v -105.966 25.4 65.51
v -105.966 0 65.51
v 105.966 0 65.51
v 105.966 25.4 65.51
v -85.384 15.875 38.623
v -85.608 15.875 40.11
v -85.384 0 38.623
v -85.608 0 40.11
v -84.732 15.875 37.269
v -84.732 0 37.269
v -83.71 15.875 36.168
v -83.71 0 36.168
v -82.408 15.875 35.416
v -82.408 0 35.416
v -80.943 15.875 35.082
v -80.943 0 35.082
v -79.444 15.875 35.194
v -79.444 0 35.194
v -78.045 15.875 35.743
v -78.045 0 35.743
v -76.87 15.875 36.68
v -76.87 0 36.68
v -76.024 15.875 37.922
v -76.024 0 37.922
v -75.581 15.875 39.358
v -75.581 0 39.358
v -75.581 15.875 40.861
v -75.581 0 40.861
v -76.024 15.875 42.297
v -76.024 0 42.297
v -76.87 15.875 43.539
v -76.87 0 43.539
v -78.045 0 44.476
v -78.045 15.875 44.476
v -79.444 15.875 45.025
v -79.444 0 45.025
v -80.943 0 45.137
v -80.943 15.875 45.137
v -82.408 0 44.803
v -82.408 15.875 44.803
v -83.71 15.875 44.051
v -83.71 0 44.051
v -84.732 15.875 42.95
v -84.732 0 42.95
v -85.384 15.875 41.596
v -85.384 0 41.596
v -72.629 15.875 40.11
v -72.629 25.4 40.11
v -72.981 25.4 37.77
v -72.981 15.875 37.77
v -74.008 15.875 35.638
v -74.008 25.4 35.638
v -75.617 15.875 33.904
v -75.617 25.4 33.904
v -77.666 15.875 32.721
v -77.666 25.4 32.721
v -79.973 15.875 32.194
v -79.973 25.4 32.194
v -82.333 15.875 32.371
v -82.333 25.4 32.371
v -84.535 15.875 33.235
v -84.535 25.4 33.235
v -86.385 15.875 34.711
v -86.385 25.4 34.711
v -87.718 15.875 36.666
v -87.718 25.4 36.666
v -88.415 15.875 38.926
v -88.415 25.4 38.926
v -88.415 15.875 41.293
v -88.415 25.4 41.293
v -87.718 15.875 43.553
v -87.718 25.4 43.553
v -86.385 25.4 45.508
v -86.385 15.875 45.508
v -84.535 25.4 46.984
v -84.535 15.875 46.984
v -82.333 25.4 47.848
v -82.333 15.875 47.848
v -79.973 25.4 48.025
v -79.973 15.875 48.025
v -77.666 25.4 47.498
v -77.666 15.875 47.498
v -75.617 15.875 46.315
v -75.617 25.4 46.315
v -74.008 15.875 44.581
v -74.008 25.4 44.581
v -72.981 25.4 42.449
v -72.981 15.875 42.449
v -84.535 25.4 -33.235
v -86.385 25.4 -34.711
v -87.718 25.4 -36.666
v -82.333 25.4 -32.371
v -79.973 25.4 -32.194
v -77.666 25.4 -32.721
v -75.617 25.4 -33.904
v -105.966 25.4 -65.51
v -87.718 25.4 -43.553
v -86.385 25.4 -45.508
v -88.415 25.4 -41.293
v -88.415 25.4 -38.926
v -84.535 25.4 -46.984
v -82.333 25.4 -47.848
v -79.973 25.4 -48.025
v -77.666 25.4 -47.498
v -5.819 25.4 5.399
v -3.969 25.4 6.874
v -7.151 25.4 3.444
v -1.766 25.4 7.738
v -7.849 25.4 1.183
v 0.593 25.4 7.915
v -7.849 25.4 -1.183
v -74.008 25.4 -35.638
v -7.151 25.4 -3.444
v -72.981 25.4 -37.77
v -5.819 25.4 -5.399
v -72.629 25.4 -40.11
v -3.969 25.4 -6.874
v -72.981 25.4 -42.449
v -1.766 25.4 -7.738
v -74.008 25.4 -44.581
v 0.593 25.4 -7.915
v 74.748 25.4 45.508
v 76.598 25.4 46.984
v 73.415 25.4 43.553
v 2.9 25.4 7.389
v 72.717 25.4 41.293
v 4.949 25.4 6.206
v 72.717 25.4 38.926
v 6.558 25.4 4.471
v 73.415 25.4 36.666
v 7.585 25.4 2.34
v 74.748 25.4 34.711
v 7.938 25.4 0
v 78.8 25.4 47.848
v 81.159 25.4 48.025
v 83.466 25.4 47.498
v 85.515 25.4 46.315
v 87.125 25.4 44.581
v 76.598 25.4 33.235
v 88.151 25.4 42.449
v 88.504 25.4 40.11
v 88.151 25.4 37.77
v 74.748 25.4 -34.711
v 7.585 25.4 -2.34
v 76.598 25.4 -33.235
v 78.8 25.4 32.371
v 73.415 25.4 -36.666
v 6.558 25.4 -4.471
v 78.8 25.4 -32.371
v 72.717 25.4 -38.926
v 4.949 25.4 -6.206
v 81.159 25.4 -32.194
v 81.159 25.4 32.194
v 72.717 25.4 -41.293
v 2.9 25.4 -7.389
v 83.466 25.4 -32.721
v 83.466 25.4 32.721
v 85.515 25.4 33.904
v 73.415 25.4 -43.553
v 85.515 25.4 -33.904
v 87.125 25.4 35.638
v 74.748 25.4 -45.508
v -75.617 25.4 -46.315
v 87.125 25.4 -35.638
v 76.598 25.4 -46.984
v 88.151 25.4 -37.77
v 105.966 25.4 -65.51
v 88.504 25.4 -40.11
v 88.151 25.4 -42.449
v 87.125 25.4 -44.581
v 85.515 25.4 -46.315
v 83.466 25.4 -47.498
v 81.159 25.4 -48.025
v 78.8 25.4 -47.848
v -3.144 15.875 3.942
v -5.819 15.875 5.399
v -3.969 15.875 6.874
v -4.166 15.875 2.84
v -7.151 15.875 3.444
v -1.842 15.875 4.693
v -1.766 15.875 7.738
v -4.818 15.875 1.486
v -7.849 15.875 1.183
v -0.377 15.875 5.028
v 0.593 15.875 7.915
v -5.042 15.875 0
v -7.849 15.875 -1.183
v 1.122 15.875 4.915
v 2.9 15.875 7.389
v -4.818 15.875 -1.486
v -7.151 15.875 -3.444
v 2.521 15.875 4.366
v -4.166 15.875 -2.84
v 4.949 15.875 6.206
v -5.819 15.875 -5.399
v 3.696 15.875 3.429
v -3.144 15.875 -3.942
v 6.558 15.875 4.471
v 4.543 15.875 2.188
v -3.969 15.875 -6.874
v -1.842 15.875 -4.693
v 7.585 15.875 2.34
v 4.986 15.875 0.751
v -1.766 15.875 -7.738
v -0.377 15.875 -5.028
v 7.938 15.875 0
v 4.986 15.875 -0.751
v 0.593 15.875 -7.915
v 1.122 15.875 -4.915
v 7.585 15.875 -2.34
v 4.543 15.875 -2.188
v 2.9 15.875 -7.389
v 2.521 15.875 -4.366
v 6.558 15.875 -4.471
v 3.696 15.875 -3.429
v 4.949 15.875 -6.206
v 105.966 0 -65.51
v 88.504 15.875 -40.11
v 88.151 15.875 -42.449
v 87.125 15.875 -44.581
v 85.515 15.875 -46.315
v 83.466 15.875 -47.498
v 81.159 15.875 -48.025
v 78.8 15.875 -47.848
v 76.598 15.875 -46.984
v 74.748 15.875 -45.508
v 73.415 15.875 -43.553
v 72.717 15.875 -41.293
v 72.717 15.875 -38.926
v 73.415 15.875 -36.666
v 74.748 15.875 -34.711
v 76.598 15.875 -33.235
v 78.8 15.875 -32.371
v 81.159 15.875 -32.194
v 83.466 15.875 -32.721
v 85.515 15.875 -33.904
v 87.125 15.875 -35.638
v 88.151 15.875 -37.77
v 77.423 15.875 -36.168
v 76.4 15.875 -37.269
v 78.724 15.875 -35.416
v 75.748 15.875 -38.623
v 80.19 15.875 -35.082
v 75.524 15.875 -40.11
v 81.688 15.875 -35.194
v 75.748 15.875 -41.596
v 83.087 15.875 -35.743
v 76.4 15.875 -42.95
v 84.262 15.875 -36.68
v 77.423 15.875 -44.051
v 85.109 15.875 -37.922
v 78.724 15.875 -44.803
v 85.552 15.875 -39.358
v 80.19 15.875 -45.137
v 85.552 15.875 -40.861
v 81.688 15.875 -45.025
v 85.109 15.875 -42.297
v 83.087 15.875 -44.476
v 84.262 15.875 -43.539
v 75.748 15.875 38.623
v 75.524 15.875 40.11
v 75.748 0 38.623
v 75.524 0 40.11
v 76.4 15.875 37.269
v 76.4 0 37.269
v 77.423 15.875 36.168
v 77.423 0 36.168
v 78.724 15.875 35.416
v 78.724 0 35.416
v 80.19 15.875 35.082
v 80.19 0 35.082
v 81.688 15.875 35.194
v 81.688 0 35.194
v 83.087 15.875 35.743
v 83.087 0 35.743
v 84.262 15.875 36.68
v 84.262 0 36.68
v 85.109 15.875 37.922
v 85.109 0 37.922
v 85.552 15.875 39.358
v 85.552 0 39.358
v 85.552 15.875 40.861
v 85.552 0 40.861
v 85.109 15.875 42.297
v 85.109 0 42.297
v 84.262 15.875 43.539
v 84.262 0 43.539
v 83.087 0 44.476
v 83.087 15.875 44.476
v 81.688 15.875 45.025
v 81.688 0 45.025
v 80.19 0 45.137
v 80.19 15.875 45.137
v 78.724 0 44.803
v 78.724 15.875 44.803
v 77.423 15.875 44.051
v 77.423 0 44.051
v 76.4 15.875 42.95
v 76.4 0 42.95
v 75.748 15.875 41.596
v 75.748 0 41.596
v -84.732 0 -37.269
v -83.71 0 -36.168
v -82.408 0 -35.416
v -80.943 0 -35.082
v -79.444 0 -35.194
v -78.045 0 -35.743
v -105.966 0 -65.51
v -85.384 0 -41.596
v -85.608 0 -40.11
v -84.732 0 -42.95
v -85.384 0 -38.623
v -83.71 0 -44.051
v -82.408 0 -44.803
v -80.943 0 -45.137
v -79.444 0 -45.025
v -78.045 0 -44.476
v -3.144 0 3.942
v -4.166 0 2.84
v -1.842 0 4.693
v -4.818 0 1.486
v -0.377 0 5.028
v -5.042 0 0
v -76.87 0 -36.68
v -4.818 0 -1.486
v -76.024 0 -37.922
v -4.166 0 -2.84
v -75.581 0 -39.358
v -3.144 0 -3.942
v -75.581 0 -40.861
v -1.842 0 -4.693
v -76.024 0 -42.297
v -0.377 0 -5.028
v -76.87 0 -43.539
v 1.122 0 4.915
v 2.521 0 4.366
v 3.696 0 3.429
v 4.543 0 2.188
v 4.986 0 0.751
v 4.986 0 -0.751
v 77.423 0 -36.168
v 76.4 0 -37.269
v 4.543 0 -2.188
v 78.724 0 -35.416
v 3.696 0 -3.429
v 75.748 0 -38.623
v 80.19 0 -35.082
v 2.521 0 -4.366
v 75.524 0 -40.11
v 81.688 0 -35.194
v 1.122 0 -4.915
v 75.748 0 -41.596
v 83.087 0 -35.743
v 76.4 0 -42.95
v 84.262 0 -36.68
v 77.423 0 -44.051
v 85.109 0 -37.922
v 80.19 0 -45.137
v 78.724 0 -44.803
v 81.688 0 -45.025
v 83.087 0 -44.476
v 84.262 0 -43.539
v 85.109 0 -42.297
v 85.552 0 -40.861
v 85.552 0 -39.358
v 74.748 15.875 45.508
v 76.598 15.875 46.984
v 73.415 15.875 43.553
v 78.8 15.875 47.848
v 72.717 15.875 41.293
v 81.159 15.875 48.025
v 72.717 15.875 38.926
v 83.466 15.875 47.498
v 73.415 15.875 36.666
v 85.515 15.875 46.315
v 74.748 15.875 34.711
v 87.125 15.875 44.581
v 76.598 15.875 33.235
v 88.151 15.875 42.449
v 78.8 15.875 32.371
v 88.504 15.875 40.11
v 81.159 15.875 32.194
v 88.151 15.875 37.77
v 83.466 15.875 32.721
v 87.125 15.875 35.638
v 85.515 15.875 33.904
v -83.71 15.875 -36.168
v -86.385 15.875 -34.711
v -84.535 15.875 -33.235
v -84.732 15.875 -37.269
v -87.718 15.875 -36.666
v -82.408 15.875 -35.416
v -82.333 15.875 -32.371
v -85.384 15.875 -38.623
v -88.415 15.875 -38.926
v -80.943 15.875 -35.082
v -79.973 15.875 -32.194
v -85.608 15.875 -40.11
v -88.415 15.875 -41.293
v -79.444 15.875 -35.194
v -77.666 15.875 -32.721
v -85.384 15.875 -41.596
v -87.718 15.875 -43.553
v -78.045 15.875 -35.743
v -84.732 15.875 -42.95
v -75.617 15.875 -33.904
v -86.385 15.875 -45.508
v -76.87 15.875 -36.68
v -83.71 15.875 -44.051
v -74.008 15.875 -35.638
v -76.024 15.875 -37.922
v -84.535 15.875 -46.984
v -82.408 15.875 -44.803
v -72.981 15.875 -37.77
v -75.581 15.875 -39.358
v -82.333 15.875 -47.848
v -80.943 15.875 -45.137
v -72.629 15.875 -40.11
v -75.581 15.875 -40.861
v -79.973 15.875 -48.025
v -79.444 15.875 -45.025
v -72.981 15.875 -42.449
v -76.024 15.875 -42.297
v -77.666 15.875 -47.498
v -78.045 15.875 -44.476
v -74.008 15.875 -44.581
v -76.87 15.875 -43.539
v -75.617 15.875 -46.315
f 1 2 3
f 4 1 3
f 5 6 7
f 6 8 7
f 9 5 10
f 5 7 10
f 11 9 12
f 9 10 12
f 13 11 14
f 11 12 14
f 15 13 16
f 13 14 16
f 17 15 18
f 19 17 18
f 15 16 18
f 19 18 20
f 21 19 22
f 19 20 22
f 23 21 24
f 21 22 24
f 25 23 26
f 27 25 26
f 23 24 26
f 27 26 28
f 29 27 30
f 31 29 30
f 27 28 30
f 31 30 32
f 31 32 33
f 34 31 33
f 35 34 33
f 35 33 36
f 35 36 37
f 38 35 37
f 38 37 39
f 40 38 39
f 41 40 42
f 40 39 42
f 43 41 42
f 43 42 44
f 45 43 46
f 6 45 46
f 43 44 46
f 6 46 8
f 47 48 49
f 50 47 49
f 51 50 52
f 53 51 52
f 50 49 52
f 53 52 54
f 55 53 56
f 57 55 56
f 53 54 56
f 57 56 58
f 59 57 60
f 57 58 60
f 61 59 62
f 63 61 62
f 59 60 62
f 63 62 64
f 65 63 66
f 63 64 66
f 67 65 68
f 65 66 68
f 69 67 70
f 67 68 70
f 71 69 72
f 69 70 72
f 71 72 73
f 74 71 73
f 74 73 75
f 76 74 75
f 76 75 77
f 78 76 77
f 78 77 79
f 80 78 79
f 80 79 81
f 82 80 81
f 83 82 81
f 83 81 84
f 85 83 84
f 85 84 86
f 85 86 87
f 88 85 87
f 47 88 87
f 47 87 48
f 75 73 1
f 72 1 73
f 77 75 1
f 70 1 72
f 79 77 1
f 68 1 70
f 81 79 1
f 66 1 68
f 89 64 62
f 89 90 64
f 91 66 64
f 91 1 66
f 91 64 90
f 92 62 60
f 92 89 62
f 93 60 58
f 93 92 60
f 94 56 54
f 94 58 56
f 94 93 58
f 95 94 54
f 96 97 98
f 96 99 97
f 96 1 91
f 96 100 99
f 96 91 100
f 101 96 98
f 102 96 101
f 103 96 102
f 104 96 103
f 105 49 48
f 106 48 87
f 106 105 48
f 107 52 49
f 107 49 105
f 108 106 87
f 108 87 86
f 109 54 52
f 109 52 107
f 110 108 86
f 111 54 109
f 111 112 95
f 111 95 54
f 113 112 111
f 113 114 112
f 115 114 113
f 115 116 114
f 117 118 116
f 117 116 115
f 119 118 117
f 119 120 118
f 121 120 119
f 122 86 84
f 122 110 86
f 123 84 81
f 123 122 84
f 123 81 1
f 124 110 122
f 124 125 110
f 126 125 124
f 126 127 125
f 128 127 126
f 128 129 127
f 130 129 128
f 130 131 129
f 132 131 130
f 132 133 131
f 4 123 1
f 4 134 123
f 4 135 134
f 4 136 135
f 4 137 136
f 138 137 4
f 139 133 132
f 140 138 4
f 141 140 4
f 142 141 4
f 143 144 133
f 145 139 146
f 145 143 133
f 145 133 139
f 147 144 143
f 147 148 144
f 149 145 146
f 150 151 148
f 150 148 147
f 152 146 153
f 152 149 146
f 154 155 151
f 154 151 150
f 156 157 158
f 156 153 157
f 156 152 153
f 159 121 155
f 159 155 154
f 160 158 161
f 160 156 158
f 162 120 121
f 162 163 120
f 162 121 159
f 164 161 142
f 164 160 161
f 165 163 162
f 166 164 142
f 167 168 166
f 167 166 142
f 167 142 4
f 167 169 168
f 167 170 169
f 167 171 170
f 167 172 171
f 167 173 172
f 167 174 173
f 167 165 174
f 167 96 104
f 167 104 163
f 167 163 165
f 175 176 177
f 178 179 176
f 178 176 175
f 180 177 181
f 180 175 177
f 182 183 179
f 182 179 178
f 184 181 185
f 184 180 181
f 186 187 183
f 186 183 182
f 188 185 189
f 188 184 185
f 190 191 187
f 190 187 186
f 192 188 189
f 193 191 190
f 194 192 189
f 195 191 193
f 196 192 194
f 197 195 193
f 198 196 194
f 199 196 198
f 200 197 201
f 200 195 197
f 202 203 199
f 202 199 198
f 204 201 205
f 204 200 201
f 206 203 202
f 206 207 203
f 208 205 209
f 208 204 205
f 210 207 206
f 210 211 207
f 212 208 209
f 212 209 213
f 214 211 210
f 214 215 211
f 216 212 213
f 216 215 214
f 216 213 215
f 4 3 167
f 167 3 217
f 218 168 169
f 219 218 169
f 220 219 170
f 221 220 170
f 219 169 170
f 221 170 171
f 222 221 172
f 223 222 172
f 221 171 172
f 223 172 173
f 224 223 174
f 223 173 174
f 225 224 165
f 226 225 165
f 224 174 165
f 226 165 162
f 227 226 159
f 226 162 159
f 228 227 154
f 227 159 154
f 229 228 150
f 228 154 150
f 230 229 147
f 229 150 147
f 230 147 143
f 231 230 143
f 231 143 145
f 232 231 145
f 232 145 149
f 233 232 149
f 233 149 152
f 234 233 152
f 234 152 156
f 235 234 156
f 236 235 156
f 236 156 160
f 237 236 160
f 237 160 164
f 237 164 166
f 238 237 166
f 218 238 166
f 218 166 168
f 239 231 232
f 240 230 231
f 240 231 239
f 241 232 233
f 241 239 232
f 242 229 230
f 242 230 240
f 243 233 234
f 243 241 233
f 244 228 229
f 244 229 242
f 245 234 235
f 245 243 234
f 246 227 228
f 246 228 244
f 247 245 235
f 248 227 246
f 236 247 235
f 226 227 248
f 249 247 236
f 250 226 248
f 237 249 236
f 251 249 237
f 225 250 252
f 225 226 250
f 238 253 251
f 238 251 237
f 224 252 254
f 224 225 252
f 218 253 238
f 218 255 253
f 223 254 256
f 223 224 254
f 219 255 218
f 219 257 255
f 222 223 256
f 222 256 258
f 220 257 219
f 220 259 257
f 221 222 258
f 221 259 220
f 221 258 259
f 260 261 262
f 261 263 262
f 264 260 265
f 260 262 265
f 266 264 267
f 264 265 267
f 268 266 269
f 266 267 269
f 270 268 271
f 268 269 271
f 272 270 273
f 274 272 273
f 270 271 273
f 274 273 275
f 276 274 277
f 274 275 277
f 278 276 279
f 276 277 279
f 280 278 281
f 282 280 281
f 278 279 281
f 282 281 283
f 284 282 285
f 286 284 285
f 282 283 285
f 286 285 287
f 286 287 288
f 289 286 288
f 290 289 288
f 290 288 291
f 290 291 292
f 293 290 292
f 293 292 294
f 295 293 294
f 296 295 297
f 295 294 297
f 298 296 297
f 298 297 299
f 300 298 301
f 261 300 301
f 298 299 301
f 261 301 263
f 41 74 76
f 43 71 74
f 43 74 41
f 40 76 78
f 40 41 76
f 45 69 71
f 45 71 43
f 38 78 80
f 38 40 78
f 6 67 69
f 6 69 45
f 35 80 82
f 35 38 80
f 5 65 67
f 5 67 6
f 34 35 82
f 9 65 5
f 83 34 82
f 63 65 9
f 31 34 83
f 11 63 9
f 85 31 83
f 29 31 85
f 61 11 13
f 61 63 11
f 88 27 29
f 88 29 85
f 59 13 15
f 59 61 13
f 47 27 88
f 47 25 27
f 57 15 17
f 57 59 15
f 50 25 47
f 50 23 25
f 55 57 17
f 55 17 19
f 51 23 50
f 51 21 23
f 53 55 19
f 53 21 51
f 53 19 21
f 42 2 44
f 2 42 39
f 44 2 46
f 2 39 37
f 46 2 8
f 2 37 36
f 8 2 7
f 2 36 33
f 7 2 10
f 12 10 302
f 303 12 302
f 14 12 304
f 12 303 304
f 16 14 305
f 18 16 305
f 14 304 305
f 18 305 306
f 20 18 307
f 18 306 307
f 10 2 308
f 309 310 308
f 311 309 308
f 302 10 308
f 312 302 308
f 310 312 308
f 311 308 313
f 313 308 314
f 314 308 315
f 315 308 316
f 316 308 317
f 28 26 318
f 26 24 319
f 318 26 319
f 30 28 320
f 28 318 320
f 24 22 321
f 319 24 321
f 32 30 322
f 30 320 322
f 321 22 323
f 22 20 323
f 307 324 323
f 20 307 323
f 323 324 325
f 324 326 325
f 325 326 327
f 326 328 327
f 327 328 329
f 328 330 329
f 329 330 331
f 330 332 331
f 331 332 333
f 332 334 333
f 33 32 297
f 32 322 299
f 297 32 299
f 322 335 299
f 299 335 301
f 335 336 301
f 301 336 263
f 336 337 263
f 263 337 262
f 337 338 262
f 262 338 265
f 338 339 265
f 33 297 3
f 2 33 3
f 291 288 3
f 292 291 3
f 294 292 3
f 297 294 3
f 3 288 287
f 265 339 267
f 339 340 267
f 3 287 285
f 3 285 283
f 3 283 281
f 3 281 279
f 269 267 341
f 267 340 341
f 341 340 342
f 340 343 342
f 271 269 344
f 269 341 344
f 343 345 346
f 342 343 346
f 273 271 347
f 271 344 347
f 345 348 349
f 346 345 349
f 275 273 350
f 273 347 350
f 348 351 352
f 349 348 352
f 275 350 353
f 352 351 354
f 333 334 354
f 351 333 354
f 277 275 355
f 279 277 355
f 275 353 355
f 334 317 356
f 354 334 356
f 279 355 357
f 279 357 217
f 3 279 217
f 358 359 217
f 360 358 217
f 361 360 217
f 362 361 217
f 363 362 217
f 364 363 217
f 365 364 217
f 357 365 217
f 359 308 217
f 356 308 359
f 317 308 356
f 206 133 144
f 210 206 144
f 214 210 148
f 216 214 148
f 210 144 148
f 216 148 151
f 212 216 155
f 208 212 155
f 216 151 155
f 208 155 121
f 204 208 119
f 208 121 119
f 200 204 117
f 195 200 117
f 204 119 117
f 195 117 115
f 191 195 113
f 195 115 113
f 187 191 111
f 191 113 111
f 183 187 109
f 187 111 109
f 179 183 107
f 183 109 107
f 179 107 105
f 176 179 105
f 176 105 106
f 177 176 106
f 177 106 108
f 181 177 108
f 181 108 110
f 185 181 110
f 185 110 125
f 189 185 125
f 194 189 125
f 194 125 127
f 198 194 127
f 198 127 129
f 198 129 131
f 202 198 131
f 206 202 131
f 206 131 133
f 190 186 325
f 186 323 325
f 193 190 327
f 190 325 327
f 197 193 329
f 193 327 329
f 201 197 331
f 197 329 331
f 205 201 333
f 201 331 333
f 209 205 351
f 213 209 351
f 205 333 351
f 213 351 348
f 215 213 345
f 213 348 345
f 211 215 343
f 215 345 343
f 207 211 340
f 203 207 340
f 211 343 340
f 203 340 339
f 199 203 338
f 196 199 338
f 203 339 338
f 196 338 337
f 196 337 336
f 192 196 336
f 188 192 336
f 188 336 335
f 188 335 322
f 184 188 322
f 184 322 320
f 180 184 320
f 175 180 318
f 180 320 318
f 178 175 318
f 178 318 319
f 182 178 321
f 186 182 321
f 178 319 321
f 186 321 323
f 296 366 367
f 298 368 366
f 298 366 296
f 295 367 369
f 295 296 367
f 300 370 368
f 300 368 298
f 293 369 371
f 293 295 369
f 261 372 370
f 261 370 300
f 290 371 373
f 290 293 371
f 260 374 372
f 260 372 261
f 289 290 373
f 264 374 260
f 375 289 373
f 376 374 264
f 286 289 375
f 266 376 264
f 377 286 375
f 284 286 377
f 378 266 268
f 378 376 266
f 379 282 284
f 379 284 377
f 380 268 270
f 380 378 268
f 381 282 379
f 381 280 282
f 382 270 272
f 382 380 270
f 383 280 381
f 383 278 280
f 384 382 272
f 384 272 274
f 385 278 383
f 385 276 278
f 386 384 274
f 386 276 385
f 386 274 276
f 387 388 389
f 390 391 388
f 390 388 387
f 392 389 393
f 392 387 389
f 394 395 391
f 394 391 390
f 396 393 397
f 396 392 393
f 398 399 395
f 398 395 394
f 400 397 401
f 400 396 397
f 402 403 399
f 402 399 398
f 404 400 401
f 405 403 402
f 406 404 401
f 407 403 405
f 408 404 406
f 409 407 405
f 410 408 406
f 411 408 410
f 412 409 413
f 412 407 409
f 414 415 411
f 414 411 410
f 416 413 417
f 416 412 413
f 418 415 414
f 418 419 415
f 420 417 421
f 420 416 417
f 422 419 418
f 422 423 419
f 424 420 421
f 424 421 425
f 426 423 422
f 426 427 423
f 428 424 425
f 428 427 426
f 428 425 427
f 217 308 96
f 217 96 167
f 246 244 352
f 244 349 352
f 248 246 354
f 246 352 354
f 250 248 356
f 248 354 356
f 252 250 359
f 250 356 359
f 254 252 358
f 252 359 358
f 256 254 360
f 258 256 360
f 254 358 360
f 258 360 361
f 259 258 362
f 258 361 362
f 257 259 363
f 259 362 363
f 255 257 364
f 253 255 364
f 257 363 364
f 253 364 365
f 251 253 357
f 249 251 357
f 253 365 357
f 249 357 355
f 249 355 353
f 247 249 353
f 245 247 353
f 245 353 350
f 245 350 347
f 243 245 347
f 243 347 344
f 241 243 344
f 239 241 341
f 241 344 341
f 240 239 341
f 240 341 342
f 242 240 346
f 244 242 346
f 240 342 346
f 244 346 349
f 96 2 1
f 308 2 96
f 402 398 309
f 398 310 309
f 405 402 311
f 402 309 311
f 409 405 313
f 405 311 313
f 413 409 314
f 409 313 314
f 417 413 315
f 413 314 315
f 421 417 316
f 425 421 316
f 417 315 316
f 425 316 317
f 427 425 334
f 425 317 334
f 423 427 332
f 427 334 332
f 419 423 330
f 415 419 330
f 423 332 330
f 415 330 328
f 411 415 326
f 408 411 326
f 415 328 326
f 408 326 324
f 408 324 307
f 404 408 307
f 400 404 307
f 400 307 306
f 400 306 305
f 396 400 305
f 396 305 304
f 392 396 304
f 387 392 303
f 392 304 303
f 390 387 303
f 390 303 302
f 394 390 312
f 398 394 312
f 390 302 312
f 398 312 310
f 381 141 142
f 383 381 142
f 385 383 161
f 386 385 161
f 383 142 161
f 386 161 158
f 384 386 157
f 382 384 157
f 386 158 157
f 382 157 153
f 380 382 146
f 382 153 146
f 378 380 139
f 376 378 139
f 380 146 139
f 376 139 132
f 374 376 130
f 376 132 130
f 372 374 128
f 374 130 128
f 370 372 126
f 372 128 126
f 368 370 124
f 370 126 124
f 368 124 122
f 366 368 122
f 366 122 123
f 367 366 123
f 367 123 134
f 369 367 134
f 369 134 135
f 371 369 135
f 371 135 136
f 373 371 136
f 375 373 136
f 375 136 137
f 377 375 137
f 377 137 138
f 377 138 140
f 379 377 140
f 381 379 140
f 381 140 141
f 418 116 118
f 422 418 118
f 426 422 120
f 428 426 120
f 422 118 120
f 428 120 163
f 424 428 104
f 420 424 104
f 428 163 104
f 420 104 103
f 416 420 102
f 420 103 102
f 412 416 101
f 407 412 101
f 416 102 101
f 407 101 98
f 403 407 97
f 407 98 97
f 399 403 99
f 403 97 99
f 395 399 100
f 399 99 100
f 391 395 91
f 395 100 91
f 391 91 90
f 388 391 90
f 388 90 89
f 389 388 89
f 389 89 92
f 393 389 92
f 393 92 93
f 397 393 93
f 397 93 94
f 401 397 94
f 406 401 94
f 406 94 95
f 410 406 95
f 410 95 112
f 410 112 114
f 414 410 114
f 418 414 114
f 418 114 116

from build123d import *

# Parameters (mm, degrees)
SKETCH1_W                                        = 211.932606224
SKETCH1_H                                        = 131.01903931
BOSS_EXTRUDE1_DEPTH                              = 25.4
CBORE_FOR_3_8_SOCKET_HEAD_CAP_SCREW1_D           = 10.0838
CBORE_FOR_3_8_SOCKET_HEAD_CAP_SCREW1_CBORE_D     = 15.875
CBORE_FOR_3_8_SOCKET_HEAD_CAP_SCREW1_CBORE_DEPTH = 9.525


with BuildPart() as part:
    # Sketch1 → Boss-Extrude1 (new body)
    with BuildSketch(Plane(origin=(0, 0, 0), x_dir=(1, 0, 0), z_dir=(0, 1, 0))):
        Rectangle(SKETCH1_W, SKETCH1_H)
    extrude(amount=BOSS_EXTRUDE1_DEPTH)

    # CBORE for 3/8 Socket Head Cap Screw1 (through all)
    with Locations(Plane(origin=(0, 25.4, 0), x_dir=(1, 0, 0), z_dir=(0, 1, 0))):
        with Locations((-80.566303112, -40.109519655), (-80.566303112, 40.109519655), (80.566303112, 40.109519655), (80.566303112, -40.109519655), (0, 0)):
            CounterBoreHole(CBORE_FOR_3_8_SOCKET_HEAD_CAP_SCREW1_D / 2, CBORE_FOR_3_8_SOCKET_HEAD_CAP_SCREW1_CBORE_D / 2, CBORE_FOR_3_8_SOCKET_HEAD_CAP_SCREW1_CBORE_DEPTH)


solid = part.part
